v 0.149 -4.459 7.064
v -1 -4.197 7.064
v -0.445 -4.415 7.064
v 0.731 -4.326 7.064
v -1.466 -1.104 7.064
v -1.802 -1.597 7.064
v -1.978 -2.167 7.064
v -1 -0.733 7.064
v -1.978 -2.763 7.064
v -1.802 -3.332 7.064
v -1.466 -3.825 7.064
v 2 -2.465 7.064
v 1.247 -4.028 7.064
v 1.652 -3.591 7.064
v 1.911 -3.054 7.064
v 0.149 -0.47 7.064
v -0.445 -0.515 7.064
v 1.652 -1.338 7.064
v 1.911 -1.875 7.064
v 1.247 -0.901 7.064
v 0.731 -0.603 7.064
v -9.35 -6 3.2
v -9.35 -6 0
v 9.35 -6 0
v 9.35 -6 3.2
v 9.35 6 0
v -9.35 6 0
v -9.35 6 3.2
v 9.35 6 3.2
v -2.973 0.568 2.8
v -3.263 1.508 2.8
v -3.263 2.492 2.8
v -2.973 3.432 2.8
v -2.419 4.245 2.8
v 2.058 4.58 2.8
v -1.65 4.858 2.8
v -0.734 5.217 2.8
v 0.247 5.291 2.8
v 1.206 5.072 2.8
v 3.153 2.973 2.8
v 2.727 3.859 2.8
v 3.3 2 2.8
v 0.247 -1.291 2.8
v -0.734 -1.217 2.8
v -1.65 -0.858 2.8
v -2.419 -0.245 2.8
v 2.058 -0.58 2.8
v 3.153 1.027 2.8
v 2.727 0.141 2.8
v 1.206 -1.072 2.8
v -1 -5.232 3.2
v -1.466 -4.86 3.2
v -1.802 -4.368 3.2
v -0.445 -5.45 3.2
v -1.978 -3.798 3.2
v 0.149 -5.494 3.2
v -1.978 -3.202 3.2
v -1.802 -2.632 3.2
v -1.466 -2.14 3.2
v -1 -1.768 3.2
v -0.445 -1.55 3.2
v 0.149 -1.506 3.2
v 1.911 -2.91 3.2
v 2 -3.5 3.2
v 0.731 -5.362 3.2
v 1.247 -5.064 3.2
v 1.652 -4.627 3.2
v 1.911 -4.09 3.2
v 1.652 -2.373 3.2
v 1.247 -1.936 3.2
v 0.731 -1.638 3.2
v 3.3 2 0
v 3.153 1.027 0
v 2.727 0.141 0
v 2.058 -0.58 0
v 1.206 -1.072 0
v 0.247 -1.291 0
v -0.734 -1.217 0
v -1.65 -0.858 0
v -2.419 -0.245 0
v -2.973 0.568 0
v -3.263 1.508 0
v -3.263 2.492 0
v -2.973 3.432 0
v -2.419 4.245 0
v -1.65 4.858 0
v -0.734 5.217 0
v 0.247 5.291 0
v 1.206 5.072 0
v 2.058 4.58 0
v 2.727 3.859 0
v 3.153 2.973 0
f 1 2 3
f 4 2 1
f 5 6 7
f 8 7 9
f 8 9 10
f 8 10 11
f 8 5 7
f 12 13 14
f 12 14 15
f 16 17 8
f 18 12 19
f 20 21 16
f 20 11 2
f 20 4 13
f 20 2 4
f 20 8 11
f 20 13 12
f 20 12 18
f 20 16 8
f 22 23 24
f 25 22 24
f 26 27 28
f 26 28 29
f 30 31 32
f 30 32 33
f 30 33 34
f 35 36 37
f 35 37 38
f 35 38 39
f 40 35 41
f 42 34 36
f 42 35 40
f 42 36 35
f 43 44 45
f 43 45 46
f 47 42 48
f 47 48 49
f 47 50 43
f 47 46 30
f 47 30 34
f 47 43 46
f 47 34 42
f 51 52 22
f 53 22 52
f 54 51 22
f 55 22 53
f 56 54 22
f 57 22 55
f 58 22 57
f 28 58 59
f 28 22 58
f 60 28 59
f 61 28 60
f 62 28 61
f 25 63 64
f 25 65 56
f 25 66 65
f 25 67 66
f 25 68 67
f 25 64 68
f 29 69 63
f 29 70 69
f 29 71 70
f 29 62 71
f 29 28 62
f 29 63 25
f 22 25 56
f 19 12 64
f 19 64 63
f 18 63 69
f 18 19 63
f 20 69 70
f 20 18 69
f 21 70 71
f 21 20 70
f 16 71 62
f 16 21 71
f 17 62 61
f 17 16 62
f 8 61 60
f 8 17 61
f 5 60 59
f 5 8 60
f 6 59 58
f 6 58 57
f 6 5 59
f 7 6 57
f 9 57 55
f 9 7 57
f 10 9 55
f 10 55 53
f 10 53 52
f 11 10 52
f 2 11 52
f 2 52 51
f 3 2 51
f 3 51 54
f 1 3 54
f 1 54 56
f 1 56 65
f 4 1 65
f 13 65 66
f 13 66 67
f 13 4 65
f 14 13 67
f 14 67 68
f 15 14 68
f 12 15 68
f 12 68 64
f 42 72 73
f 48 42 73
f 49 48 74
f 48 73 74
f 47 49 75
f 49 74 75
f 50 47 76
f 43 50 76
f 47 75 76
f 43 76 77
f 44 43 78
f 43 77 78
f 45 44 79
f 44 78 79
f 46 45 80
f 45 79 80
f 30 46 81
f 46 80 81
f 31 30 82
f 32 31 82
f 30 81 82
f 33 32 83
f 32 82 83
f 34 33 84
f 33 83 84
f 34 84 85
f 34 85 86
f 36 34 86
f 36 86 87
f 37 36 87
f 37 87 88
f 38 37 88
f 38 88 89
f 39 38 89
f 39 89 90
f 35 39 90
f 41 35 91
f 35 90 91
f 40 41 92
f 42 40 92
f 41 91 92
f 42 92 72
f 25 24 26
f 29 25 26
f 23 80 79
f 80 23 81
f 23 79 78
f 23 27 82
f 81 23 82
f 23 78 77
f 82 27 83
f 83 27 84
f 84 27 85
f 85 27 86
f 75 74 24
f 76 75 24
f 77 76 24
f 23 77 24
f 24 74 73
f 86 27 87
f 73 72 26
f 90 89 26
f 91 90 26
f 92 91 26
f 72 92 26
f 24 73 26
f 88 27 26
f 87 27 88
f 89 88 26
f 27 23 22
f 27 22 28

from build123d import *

# Parameters (mm, degrees)
F0_W     = 18.7
F0_H     = 12
F1_DEPTH = 3.2
F3_R     = 3.3
F4_DEPTH = 2.8
F2_R     = 2


with BuildPart() as f1:
    # F0 (on Top) → F1 (new body)
    with BuildSketch(Plane.XY):
        Rectangle(F0_W, F0_H)
    extrude(amount=F1_DEPTH)

    # F3 (on face) → F4 (cut)
    with BuildSketch(Plane(origin=(0, 0, 0), x_dir=(1, 0, 0), z_dir=(0, 0, -1))):
        with Locations((0, -2)):
            Circle(F3_R)
    extrude(amount=-F4_DEPTH, mode=Mode.SUBTRACT)

    # F6: sweep along a path in F5
    with BuildLine(Plane.YZ) as f6_path:
        Line((-3.5, 3.2), (-2.4647238196, 7.0637033052))
    # F2 (on face) → F6 (sweep)
    with BuildSketch(Plane.XY.offset(3.2)):
        with Locations((0, -3.5)):
            Circle(F2_R)
    sweep(path=f6_path.line)


solid = f1.part
